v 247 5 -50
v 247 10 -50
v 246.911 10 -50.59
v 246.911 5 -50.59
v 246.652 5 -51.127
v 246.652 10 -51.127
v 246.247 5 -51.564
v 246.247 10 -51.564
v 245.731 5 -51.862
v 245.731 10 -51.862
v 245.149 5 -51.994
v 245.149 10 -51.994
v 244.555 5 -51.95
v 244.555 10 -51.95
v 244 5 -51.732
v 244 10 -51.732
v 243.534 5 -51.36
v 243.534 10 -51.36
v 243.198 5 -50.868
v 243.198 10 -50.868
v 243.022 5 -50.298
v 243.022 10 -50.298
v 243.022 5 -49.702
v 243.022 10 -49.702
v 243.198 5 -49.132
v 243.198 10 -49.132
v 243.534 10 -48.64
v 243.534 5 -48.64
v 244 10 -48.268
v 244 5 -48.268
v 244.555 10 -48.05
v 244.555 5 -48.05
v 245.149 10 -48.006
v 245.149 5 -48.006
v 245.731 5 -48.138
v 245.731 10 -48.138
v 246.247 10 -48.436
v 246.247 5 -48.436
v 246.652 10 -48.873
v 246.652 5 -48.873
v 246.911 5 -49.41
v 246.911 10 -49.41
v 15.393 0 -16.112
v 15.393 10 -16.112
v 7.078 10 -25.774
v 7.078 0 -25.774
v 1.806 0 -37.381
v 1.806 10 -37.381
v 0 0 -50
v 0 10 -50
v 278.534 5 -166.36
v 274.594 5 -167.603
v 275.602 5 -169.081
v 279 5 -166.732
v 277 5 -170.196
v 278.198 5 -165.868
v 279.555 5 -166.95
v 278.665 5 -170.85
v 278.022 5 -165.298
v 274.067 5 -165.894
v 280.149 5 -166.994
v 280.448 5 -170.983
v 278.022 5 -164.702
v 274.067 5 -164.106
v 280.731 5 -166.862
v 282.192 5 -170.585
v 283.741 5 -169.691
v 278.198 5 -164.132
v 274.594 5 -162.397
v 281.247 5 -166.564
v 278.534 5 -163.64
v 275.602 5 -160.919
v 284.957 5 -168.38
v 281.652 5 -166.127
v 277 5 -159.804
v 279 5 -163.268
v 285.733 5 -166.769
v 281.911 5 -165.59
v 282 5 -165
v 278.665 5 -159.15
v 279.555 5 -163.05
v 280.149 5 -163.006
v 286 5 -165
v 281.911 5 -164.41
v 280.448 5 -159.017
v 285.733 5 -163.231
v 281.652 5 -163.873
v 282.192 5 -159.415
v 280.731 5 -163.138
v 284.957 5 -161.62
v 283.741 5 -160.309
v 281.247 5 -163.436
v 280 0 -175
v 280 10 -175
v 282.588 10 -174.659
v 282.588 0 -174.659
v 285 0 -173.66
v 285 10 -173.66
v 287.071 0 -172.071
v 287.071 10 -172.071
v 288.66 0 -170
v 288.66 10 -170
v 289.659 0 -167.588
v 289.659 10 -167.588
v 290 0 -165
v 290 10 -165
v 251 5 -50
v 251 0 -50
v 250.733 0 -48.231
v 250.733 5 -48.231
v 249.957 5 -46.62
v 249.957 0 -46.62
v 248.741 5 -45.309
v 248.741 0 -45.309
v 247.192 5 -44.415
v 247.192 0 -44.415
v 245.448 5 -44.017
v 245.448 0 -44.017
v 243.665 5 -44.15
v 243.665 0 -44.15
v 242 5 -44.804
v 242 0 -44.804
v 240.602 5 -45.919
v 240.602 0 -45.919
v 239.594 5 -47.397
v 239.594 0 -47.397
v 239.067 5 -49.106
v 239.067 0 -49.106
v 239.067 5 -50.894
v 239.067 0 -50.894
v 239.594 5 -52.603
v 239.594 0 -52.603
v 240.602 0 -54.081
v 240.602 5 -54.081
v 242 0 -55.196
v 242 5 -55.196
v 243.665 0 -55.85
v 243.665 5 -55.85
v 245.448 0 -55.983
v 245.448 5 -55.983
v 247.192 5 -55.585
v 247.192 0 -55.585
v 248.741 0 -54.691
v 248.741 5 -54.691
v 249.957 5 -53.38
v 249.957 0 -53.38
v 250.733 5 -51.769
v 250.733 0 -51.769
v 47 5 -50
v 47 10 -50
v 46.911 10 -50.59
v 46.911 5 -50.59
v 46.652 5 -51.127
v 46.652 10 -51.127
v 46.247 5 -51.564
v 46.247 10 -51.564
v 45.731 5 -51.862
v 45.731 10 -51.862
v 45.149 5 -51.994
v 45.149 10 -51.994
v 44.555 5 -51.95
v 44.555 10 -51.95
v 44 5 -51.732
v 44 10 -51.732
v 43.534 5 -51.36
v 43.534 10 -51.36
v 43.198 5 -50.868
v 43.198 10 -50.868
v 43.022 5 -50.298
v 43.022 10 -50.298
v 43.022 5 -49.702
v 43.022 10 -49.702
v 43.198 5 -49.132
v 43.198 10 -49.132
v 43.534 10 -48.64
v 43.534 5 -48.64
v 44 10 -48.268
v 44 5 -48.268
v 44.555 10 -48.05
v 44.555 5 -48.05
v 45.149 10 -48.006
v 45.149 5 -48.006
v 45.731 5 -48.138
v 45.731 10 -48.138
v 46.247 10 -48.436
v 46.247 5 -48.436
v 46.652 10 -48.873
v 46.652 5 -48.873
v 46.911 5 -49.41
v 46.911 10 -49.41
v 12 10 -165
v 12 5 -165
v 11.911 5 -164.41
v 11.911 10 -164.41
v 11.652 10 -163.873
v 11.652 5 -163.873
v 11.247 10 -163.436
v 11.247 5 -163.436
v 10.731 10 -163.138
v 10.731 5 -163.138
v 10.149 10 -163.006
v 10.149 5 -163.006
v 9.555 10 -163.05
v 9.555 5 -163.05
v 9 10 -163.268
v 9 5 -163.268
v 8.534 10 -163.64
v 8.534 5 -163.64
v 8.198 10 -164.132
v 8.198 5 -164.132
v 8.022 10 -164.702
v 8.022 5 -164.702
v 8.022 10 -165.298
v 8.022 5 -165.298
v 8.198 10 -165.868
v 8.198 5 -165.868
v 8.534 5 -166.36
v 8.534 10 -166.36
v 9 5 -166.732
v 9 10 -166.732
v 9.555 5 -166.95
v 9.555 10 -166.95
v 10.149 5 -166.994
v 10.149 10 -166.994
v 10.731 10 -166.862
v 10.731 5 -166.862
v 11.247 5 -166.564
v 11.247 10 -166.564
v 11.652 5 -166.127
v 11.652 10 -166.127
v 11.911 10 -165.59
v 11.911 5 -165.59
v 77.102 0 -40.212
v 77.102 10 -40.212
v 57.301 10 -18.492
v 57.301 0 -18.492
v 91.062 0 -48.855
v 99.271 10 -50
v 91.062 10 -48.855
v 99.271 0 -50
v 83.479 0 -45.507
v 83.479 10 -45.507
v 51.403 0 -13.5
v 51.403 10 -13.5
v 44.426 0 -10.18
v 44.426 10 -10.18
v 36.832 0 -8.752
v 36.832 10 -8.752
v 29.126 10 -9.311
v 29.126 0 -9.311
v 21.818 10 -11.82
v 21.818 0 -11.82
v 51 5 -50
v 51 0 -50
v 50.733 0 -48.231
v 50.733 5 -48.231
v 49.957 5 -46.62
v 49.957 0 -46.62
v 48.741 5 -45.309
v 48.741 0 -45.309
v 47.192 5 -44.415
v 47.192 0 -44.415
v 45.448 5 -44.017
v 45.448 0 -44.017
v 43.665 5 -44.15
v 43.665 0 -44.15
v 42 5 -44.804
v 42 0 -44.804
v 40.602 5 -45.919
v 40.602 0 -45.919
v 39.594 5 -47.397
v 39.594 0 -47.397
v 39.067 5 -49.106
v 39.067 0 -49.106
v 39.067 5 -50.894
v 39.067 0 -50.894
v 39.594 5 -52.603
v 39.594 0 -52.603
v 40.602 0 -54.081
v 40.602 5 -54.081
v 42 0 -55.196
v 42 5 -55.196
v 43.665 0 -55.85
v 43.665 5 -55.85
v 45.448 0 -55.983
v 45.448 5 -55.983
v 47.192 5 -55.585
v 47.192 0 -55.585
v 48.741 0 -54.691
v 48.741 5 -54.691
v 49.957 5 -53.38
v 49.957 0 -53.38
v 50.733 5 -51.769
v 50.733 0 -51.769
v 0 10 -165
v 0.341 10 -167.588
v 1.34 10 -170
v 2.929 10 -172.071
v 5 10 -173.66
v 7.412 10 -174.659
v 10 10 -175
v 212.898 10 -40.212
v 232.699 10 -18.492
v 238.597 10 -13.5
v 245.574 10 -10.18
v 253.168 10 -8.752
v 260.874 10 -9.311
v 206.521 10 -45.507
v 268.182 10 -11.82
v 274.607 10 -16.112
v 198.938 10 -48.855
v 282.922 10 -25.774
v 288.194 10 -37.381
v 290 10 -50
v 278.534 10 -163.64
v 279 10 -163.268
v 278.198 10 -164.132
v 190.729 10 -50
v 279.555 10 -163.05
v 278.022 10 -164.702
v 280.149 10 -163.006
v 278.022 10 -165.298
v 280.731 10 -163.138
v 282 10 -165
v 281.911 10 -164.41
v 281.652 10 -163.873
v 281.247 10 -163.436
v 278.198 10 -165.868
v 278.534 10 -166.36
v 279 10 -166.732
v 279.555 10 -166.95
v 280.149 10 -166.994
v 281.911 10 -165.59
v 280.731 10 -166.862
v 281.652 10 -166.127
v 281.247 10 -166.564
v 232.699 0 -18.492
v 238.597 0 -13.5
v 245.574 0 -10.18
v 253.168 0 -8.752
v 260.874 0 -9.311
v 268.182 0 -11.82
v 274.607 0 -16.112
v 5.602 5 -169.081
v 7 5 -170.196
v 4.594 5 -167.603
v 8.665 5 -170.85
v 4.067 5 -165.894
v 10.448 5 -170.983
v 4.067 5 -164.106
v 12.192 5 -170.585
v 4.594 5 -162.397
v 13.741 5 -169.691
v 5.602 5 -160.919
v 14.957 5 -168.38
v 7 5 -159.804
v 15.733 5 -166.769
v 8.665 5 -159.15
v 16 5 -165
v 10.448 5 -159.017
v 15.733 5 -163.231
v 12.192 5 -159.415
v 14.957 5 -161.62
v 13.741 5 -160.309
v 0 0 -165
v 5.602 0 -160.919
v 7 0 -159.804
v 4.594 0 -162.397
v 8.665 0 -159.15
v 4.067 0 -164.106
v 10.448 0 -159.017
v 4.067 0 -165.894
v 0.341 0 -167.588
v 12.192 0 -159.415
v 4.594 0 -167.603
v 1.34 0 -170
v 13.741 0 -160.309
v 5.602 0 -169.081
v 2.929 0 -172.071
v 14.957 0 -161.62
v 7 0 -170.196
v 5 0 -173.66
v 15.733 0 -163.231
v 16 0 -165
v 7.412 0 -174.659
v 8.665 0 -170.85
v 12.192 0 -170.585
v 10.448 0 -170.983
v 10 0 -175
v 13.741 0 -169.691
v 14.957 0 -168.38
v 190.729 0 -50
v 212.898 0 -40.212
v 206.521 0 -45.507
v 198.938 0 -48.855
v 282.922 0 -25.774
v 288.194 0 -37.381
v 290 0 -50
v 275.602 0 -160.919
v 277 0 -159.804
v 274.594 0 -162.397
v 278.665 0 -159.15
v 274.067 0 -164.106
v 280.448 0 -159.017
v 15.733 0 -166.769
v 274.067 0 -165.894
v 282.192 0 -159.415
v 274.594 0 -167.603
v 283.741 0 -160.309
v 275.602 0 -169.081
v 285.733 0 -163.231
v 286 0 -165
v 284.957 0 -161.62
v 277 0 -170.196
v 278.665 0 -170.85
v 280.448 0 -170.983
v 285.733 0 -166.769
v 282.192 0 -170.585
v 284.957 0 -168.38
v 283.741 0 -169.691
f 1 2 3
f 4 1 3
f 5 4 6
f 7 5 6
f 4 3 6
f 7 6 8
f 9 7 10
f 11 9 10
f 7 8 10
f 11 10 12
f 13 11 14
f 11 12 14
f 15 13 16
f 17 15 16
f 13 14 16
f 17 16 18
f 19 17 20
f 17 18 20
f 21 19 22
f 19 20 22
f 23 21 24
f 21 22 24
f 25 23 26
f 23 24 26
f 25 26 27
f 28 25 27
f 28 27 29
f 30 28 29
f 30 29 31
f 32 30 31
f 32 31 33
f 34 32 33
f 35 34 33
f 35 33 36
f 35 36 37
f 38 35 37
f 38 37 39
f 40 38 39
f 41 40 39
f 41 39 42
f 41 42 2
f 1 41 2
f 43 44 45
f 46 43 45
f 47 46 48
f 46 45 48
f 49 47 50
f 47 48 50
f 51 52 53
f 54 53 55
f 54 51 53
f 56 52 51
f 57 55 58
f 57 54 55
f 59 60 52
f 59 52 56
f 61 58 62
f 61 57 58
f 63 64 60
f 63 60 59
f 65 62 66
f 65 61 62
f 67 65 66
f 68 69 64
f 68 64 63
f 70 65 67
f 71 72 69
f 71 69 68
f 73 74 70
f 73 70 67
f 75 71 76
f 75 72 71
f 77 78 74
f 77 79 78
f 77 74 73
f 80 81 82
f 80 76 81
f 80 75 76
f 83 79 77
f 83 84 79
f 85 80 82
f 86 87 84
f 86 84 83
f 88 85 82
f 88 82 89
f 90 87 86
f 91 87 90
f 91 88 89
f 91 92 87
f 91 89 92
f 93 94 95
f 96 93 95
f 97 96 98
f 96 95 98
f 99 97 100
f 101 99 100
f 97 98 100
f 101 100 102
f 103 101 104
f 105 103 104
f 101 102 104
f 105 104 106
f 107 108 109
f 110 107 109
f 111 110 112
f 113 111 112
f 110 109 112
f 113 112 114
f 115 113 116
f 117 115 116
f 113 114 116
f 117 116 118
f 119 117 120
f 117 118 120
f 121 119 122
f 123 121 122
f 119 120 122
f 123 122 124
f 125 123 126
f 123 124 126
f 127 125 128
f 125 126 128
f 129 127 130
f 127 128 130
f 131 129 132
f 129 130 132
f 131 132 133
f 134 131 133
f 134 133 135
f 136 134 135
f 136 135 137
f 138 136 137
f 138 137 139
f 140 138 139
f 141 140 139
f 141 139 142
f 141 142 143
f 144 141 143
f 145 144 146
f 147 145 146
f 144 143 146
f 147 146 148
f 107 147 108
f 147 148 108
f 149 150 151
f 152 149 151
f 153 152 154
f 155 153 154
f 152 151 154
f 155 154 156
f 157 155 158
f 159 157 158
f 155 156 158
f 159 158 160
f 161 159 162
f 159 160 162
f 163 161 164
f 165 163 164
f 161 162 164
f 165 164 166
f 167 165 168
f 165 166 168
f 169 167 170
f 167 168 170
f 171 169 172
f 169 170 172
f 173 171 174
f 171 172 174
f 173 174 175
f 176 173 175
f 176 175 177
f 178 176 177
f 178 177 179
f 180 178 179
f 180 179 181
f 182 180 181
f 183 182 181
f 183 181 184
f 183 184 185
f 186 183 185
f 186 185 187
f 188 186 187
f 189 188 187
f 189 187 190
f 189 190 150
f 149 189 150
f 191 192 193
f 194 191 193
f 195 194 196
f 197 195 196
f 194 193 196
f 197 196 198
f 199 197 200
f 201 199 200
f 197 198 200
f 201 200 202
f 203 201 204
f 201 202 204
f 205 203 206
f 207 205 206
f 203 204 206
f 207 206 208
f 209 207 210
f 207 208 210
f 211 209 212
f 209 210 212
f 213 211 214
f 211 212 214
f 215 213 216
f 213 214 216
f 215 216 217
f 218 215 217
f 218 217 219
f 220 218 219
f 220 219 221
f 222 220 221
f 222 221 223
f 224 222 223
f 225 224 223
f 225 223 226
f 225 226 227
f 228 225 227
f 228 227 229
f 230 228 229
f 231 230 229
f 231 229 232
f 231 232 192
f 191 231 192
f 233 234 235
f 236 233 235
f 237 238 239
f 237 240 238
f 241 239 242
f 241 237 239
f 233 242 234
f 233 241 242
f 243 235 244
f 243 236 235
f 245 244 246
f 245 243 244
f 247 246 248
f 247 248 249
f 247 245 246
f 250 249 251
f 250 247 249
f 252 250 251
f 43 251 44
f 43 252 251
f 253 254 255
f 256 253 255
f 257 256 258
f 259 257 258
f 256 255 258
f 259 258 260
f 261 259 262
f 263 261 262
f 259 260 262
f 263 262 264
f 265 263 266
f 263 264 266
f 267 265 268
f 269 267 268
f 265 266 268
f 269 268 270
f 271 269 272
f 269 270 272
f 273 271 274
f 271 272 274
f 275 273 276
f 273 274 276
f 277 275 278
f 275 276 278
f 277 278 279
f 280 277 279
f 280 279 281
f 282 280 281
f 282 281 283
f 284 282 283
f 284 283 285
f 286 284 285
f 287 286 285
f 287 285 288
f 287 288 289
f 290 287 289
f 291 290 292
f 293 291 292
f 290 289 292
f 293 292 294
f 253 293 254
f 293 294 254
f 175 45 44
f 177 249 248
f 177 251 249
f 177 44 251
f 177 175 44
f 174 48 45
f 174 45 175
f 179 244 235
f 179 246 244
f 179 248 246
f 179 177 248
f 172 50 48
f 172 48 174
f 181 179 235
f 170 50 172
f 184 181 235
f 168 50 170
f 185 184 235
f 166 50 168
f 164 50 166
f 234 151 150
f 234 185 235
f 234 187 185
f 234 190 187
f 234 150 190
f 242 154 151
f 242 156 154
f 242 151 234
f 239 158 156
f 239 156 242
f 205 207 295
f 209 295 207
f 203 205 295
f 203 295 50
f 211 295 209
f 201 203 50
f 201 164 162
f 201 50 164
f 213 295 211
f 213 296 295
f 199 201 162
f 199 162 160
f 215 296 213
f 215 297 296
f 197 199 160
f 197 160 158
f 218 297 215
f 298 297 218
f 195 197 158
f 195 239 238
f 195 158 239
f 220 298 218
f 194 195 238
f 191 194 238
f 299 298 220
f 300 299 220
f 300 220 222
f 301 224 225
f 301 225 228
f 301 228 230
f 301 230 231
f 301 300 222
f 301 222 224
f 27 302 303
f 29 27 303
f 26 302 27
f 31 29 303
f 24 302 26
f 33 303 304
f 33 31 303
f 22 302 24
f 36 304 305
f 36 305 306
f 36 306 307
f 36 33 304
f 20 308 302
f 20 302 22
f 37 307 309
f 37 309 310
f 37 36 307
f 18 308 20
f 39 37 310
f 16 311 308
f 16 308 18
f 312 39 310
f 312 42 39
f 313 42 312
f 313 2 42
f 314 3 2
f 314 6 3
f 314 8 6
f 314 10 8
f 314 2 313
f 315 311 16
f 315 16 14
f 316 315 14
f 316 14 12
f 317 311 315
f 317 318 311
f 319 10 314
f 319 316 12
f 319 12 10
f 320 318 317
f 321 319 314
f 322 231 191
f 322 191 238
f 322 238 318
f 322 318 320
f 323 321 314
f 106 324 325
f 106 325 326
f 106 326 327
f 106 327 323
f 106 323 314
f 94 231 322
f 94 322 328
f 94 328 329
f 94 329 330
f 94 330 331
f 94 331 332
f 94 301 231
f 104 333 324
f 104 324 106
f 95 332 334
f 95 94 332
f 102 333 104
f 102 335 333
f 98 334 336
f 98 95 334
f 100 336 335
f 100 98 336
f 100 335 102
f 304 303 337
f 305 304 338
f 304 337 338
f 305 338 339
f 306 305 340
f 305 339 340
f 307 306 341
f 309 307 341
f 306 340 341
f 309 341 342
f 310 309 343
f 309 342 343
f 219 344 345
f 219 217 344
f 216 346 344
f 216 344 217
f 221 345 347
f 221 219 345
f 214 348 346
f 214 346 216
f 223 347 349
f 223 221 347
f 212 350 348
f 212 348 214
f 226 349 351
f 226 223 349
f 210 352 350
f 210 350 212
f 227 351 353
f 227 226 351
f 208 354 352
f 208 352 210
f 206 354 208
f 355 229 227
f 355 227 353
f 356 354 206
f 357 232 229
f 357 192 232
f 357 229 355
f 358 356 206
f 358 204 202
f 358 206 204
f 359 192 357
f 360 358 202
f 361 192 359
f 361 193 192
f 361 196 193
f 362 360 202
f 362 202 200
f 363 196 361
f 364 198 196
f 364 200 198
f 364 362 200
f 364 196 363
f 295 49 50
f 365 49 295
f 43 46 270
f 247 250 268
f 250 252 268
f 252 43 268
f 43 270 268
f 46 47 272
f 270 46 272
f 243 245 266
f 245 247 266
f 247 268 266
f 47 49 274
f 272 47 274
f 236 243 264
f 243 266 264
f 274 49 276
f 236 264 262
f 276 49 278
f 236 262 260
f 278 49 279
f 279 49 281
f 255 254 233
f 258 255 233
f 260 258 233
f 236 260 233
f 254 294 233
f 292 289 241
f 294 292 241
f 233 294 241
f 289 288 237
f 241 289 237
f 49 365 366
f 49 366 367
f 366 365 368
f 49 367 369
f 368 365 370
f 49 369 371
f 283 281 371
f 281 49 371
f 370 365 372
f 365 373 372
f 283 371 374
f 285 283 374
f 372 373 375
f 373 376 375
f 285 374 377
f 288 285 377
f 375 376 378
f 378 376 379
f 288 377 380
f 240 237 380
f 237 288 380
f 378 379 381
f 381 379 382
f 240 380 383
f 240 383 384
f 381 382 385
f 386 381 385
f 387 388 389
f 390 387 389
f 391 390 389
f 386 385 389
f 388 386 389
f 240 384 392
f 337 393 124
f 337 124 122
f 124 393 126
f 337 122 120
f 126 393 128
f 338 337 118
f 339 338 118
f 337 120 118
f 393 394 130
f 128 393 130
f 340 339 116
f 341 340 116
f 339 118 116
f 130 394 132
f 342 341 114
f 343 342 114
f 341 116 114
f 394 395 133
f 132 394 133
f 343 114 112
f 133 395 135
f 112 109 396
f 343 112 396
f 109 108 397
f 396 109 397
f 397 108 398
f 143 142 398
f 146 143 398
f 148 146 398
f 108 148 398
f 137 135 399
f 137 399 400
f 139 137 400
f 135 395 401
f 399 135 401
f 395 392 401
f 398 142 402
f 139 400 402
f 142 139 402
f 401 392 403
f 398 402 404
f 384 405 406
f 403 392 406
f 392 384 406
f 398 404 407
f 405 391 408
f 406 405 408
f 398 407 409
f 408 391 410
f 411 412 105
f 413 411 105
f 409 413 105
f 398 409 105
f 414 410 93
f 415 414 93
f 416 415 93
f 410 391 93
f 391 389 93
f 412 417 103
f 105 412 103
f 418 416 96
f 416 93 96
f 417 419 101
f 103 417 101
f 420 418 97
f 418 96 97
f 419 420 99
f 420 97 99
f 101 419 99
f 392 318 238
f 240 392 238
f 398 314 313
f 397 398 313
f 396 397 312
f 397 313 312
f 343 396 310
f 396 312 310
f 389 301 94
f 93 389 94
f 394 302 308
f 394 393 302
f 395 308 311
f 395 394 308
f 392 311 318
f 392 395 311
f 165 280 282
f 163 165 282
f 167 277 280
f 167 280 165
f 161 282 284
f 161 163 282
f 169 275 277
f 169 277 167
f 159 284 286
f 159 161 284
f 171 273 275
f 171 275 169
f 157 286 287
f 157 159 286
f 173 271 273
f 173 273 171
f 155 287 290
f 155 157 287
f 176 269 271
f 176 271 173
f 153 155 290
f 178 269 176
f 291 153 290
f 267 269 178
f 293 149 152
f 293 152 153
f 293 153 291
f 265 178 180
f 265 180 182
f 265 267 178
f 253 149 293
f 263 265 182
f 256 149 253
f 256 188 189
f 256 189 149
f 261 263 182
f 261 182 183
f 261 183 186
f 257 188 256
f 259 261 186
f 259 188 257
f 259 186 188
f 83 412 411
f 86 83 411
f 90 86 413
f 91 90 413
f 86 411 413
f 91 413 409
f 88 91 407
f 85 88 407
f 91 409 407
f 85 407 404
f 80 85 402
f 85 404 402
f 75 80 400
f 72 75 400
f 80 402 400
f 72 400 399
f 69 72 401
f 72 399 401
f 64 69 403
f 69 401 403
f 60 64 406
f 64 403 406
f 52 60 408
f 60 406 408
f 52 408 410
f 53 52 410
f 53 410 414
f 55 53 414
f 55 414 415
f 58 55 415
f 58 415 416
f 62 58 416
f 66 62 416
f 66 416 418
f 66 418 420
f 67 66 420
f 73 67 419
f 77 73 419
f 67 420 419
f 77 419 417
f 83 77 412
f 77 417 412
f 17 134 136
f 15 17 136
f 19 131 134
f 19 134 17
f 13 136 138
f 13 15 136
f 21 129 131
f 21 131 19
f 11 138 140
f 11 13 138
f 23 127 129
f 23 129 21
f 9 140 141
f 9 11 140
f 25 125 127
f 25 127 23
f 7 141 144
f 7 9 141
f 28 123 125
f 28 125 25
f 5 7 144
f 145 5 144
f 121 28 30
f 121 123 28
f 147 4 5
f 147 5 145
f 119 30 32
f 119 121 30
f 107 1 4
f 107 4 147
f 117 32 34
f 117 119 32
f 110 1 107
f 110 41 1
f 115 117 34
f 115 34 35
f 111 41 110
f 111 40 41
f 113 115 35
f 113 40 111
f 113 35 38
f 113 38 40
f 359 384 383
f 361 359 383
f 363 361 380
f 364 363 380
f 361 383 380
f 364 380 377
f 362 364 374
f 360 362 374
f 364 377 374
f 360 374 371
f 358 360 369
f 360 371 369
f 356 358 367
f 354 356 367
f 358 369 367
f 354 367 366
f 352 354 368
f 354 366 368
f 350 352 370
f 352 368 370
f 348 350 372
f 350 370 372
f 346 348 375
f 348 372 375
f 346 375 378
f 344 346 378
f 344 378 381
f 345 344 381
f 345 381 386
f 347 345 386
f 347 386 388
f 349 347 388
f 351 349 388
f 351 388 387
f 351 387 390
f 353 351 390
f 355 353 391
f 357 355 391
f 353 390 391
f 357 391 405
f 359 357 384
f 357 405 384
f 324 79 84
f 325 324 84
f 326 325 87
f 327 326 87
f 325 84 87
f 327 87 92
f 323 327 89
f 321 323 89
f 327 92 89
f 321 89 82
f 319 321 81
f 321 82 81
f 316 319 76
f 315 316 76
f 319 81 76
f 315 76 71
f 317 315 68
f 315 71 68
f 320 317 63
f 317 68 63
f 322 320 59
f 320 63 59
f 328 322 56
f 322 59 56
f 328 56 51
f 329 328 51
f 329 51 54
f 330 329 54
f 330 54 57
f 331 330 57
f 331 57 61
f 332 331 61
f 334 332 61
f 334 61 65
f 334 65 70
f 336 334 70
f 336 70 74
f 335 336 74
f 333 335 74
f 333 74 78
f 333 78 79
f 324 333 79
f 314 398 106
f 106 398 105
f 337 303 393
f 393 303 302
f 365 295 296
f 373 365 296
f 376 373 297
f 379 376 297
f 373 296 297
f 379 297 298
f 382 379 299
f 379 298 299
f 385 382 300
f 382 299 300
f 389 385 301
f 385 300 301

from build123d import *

# Parameters (mm, degrees)
ESQUISSE2_W              = 290
ESQUISSE2_H              = 184.53
BOSS_EXTRU_1_DEPTH       = 10
ESQUISSE9_R              = 2
ENL_V_MAT_EXTRU_7_DEPTH  = 10
ESQUISSE12_R             = 2
ENL_V_MAT_EXTRU_10_DEPTH = 10
ENL_V_MAT_EXTRU_12_DEPTH = 10
ENL_V_MAT_EXTRU_13_DEPTH = 10
CONG_1_R                 = 30
CONG_2_R                 = 30
ESQUISSE16_R             = 6
ENL_V_MAT_EXTRU_14_DEPTH = 5


with BuildPart() as part:
    # Esquisse2 → Boss.-Extru.1 (new body)
    with BuildSketch(Plane(origin=(0, 0, 0), x_dir=(1, 0, 0), z_dir=(0, 1, 0))):
        with Locations((145, 92.265)):
            Rectangle(ESQUISSE2_W, ESQUISSE2_H)
    extrude(amount=BOSS_EXTRU_1_DEPTH)

    # Esquisse9 → Enlèv. mat.-Extru.7 (cut)
    with BuildSketch(Plane(origin=(0, 10, 0), x_dir=(1, 0, 0), z_dir=(0, 1, 0))):
        with Locations((45, 50)):
            Circle(ESQUISSE9_R)
        with Locations((245, 50)):
            Circle(ESQUISSE9_R)
    extrude(amount=-ENL_V_MAT_EXTRU_7_DEPTH, mode=Mode.SUBTRACT)

    # Esquisse12 → Enlèv. mat.-Extru.10 (cut)
    with BuildSketch(Plane.XZ):
        with Locations((10, -165)):
            Circle(ESQUISSE12_R)
        with Locations((280, -165)):
            Circle(ESQUISSE12_R)
    extrude(amount=-ENL_V_MAT_EXTRU_10_DEPTH, mode=Mode.SUBTRACT)

    # Esquisse14 → Enlèv. mat.-Extru.12 (cut)
    with BuildSketch(Plane(origin=(0, 10, 0), x_dir=(1, 0, 0), z_dir=(0, 1, 0))):
        with BuildLine():
            Line((0, 184.53), (0, 165))
            ThreePointArc((0, 165), (2.928932188, 172.071067812), (10, 175))
            Line((10, 175), (280, 175))
            ThreePointArc((280, 175), (287.071067812, 172.071067812), (290, 165))
            Line((290, 165), (290, 184.53))
            Line((290, 184.53), (0, 184.53))
        make_face()
        with BuildLine():
            Line((245, 5), (45, 5))
            ThreePointArc((45, 5), (13.180194847, 18.180194847), (0, 50))
            Line((0, 50), (0, 0))
            Line((0, 0), (290, 0))
            Line((290, 0), (290, 50))
            ThreePointArc((290, 50), (276.819805153, 18.180194847), (245, 5))
        make_face()
    extrude(amount=-ENL_V_MAT_EXTRU_12_DEPTH, mode=Mode.SUBTRACT)

    # Esquisse15 → Enlèv. mat.-Extru.13 (cut)
    with BuildSketch(Plane(origin=(0, 10, 0), x_dir=(1, 0, 0), z_dir=(0, 1, 0))):
        Polygon((245, 5), (203.974576033, 50), (86.025423967, 50), (45, 5), align=None)
    extrude(amount=-ENL_V_MAT_EXTRU_13_DEPTH, mode=Mode.SUBTRACT)

    # Congé1
    cong_1_edges = [part.edges().sort_by_distance(p)[0] for p in [
        (86.025423967, 5, -50),
        (203.974576033, 5, -50),
    ]]
    fillet(cong_1_edges, radius=CONG_1_R)

    # Congé2
    cong_2_edges = [part.edges().sort_by_distance(p)[0] for p in [
        (45, 5, -5),
        (245, 5, -5),
    ]]
    fillet(cong_2_edges, radius=CONG_2_R)

    # Esquisse16 → Enlèv. mat.-Extru.14 (cut)
    with BuildSketch(Plane.XZ):
        with Locations((45, -50)):
            Circle(ESQUISSE16_R)
        with Locations((245, -50)):
            Circle(ESQUISSE16_R)
        with Locations((280, -165)):
            Circle(ESQUISSE16_R)
        with Locations((10, -165)):
            Circle(ESQUISSE16_R)
    extrude(amount=-ENL_V_MAT_EXTRU_14_DEPTH, mode=Mode.SUBTRACT)


solid = part.part
